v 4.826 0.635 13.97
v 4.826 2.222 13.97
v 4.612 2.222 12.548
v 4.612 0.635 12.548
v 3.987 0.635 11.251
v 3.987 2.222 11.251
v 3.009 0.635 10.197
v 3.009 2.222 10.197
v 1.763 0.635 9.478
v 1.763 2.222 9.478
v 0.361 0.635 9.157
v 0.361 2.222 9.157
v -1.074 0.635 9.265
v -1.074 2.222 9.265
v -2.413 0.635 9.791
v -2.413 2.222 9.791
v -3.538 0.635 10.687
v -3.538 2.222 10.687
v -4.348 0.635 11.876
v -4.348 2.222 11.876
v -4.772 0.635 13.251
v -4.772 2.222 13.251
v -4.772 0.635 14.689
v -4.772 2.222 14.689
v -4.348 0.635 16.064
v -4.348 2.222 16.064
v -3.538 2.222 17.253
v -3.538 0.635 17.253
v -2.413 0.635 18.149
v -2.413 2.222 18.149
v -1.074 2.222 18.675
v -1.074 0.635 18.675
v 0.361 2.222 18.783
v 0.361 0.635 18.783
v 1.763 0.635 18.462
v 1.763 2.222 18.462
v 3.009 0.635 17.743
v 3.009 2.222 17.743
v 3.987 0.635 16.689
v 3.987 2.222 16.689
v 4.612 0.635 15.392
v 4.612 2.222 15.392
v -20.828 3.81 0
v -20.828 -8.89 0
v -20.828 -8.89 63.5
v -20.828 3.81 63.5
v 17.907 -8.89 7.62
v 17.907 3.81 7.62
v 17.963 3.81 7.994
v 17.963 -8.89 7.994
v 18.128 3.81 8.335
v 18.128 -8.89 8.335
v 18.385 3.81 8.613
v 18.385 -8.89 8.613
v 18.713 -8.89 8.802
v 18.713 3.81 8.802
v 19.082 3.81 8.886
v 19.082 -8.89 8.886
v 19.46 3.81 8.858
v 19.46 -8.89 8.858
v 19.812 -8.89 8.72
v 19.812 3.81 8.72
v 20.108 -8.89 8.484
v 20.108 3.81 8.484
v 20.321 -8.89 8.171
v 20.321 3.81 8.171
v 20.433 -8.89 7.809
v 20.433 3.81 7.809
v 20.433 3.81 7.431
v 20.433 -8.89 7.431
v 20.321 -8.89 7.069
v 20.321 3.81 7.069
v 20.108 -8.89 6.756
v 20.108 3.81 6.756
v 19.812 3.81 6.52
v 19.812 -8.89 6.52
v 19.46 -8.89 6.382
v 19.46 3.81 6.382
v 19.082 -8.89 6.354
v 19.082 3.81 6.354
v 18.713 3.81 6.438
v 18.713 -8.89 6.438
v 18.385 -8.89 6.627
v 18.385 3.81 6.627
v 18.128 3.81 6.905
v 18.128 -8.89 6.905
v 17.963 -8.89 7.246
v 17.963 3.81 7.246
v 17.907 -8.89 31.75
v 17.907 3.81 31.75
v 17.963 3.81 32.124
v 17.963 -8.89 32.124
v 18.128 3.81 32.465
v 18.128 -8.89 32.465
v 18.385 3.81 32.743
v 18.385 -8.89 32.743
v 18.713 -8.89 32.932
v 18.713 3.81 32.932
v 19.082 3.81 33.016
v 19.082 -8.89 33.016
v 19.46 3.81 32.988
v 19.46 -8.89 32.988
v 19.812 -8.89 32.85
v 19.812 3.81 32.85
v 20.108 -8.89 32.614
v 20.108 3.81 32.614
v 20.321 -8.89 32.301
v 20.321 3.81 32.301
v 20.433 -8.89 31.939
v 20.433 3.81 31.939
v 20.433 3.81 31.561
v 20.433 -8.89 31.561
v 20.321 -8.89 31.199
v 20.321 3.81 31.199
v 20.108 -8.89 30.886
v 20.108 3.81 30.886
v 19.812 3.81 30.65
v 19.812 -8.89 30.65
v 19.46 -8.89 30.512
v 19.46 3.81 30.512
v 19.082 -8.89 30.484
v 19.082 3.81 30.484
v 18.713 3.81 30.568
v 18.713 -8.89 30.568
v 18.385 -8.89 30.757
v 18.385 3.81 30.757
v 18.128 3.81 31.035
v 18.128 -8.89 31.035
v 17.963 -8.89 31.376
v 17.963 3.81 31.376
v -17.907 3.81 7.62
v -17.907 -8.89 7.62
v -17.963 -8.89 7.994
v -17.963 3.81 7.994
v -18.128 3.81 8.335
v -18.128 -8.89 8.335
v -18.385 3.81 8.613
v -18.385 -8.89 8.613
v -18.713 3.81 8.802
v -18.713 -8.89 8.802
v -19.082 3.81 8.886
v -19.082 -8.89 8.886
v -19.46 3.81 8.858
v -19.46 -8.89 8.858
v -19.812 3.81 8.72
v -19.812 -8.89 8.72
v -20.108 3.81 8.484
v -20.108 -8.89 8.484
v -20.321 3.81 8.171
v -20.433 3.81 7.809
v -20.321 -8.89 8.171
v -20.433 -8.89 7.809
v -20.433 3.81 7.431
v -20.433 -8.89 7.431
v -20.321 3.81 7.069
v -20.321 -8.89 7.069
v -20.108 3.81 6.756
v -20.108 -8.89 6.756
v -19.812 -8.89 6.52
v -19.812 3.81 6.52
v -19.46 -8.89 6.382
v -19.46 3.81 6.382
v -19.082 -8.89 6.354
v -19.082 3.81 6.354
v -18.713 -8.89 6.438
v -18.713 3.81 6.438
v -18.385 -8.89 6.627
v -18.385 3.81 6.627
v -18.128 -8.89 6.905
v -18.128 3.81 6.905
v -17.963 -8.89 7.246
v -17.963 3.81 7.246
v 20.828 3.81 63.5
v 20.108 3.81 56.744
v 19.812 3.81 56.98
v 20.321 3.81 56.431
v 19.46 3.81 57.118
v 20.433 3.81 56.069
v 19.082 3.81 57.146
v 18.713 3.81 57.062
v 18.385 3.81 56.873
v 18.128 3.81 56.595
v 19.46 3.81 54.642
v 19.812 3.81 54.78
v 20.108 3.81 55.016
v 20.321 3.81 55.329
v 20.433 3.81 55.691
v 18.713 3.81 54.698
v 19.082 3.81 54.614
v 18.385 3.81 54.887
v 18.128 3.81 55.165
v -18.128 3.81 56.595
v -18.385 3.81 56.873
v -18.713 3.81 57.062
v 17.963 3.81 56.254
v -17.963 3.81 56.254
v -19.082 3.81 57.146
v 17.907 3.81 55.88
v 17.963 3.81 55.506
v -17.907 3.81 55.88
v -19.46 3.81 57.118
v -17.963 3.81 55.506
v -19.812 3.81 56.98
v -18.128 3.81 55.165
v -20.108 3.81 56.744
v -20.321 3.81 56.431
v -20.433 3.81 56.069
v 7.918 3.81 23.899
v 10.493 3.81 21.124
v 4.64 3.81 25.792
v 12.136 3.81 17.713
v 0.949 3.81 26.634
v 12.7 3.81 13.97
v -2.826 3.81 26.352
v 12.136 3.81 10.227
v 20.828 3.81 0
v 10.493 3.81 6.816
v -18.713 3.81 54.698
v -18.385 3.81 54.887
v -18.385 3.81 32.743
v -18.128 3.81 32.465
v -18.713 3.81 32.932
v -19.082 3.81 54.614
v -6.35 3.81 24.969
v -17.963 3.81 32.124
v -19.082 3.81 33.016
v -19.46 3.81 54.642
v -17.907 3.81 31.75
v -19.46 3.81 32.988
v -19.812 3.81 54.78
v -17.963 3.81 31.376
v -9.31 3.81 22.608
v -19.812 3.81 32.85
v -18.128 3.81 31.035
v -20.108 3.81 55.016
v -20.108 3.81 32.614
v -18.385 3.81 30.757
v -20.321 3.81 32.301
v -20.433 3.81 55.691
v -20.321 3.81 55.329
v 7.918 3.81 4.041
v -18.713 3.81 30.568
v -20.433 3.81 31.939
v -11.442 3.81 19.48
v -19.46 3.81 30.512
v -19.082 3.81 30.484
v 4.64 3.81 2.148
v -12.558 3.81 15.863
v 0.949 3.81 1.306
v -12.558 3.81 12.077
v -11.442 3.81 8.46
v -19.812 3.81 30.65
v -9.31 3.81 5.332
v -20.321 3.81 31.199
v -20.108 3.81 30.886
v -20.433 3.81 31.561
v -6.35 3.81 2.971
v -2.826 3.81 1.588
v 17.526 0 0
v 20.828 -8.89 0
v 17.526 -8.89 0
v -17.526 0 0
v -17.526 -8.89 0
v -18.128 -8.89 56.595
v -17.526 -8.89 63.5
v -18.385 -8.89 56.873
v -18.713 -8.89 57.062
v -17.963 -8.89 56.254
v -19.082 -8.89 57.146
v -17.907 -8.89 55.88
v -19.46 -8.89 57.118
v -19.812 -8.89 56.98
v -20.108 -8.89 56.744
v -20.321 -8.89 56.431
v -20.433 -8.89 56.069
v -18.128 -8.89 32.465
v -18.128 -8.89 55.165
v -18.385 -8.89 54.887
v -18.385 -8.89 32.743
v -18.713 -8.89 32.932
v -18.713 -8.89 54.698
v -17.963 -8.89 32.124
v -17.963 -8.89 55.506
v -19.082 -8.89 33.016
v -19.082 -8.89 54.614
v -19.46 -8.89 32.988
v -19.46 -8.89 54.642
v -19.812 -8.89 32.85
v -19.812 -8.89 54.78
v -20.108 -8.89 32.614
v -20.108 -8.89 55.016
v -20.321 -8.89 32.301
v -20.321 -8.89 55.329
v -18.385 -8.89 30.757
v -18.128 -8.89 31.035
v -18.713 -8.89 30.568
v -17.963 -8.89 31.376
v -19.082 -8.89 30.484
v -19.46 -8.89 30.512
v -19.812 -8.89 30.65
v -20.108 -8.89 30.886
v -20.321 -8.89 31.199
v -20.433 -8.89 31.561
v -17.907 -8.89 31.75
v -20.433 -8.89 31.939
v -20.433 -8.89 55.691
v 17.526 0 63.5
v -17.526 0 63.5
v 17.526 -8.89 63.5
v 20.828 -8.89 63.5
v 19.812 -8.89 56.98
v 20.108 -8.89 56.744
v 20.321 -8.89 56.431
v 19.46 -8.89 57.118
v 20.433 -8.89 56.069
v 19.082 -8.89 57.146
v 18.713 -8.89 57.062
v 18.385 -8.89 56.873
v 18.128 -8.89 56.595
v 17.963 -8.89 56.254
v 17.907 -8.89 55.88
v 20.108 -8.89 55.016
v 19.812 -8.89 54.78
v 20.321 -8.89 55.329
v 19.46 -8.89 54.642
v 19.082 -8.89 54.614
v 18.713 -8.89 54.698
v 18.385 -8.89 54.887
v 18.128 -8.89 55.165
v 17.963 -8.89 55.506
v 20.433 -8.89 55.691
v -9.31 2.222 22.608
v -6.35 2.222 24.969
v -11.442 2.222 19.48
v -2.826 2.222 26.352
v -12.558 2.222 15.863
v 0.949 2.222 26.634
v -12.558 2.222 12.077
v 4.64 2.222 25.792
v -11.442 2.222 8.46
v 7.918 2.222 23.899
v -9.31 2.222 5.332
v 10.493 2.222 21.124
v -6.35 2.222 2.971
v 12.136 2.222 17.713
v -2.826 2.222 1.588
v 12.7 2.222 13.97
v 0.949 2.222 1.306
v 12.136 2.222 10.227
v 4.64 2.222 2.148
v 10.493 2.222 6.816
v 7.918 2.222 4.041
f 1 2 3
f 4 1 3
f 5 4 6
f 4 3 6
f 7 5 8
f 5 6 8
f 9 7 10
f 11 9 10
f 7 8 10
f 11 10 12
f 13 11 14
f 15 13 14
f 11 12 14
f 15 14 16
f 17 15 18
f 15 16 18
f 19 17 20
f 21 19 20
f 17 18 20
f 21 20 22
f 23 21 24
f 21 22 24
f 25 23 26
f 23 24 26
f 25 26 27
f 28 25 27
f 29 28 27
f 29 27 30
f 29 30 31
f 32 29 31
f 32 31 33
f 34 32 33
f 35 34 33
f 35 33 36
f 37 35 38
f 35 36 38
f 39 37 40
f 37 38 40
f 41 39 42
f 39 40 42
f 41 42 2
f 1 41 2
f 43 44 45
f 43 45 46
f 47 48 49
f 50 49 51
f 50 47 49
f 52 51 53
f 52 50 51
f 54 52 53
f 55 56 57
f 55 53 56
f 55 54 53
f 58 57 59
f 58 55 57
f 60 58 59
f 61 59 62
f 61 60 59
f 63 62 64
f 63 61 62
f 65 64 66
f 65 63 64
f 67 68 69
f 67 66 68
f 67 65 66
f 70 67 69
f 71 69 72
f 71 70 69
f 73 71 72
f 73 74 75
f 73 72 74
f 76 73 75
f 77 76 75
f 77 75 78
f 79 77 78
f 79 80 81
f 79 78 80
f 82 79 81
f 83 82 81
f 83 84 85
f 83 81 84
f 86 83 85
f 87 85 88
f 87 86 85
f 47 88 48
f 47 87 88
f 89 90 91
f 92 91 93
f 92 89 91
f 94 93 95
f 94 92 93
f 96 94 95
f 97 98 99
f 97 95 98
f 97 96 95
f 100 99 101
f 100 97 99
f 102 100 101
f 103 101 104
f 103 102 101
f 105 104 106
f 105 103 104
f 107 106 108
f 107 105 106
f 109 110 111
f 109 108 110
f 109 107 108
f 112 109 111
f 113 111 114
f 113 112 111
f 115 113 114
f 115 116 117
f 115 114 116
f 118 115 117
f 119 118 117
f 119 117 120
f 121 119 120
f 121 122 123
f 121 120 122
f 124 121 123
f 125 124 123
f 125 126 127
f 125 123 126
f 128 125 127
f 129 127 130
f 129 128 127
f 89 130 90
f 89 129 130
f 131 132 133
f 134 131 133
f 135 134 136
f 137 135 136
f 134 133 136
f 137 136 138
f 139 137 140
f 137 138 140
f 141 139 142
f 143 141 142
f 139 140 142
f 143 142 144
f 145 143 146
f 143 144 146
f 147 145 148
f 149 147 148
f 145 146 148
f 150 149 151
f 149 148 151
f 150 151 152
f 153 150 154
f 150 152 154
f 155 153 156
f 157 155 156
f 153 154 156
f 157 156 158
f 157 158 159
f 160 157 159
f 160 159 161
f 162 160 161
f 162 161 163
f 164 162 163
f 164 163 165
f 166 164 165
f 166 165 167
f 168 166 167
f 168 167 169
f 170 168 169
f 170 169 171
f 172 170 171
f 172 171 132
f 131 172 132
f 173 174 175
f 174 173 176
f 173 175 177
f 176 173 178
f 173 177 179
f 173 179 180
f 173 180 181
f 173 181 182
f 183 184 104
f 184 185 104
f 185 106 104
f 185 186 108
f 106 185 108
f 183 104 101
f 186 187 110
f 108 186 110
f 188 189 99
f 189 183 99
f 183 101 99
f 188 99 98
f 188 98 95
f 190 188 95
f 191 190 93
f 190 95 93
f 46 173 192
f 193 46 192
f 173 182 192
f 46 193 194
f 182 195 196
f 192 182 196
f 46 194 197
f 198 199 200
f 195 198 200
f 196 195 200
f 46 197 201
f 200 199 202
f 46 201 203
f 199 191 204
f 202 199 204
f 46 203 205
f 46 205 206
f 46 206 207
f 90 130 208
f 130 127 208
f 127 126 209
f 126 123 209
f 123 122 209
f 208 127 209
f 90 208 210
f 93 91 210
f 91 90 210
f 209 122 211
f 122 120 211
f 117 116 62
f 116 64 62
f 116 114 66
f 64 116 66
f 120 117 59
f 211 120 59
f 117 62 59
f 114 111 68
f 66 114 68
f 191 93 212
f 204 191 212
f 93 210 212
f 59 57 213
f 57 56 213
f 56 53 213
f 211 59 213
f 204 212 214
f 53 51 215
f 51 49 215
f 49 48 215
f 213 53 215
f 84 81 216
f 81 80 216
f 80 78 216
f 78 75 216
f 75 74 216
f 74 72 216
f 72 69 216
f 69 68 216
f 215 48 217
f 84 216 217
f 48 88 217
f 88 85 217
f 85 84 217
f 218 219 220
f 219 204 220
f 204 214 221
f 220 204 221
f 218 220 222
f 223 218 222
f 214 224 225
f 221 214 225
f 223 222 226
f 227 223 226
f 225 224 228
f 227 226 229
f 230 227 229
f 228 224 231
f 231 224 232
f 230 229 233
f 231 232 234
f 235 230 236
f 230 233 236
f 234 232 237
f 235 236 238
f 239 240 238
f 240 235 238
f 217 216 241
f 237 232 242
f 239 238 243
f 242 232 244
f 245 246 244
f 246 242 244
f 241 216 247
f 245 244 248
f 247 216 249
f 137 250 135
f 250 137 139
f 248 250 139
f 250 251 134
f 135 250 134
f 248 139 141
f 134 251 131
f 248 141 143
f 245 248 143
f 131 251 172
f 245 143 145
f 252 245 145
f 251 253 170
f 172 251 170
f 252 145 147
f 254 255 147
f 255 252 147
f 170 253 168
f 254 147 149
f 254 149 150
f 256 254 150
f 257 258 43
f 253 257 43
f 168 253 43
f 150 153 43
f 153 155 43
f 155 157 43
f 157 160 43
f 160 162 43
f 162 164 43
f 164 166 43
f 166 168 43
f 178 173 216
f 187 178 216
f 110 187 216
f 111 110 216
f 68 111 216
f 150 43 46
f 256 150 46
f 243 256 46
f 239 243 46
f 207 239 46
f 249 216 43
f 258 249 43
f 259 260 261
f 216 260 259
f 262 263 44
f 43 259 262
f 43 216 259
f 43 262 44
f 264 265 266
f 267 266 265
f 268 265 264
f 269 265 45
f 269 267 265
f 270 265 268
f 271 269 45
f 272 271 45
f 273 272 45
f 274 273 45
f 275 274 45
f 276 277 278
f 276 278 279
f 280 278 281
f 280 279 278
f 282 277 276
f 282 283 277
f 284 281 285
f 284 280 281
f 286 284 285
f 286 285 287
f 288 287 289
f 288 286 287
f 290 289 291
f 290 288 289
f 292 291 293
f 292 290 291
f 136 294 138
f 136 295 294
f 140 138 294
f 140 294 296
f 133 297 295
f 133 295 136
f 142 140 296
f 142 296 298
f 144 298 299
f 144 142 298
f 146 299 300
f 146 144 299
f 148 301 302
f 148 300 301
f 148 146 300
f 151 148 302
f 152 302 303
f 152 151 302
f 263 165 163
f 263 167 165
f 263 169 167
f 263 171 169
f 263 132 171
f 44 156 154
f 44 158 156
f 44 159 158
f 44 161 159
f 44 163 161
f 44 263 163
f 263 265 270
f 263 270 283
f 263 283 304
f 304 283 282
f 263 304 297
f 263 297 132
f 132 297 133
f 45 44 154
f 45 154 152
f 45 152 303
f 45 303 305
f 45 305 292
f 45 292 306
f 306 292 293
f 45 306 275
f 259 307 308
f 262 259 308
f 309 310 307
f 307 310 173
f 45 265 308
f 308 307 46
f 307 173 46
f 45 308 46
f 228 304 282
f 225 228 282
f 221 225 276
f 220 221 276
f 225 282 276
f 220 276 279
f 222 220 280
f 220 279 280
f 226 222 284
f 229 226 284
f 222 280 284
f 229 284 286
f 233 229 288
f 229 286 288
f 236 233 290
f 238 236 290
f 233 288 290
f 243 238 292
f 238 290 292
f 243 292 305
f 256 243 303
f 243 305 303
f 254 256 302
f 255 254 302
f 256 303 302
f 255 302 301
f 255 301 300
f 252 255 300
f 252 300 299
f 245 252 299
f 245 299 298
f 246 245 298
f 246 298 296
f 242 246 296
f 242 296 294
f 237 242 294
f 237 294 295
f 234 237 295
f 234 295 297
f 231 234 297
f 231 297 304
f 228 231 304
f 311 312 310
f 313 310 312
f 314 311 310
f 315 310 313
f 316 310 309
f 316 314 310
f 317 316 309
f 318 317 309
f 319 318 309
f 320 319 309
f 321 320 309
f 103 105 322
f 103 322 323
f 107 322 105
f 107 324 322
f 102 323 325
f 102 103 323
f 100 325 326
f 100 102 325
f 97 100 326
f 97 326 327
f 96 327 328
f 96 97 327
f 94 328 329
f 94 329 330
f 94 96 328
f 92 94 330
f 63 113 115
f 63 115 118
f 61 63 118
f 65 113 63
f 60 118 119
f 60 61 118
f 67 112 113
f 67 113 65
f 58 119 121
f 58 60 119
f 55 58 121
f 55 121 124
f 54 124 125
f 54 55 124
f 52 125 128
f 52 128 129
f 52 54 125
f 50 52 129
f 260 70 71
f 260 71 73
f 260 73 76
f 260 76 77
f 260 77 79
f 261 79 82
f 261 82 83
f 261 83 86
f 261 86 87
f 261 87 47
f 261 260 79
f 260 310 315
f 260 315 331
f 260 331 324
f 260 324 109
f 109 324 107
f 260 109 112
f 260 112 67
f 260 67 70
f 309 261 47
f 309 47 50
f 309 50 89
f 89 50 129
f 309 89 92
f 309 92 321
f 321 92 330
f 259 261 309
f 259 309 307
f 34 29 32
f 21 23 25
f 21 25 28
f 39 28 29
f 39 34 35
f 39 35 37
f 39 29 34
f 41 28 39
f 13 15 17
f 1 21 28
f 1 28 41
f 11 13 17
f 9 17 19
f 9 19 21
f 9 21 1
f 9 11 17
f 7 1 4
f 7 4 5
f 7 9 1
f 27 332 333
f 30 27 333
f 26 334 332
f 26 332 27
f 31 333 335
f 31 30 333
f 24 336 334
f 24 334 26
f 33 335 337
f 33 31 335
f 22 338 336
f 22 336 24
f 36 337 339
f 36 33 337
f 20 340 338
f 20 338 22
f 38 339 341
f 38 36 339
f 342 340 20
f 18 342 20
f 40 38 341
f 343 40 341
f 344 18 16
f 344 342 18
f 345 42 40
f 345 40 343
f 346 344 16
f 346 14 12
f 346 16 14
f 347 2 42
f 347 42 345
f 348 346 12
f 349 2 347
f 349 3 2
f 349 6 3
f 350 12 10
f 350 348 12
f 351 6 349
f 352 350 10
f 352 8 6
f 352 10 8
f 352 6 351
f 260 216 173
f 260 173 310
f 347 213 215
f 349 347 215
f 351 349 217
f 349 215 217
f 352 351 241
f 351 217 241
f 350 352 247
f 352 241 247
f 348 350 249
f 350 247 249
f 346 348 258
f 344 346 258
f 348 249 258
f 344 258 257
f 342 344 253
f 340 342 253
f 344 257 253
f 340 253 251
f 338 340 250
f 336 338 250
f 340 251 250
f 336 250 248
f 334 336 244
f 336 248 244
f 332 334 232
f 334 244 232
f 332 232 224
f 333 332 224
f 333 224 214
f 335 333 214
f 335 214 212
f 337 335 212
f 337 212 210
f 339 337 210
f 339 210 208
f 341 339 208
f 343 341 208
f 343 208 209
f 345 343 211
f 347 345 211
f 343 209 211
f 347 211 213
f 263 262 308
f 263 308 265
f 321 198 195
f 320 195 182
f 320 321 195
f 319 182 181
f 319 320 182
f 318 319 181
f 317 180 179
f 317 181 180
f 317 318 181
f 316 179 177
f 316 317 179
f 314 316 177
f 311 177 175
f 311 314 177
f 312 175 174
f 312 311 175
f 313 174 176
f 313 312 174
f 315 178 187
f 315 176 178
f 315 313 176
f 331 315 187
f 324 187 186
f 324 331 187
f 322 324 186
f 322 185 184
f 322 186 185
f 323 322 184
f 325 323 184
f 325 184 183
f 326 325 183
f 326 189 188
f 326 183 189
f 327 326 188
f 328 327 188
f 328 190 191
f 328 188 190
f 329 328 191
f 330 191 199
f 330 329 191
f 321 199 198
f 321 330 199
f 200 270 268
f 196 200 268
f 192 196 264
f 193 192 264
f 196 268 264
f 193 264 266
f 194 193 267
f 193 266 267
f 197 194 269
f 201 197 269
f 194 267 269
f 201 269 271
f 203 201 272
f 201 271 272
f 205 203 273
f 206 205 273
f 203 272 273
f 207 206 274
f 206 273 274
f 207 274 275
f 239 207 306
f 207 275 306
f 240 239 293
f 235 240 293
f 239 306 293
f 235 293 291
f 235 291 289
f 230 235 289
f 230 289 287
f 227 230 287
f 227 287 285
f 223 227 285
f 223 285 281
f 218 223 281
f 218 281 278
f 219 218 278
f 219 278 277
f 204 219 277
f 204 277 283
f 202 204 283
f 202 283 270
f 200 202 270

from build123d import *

# Parameters (mm, degrees)
BOSS_EXTRUDE1_DEPTH = 63.5
SKETCH4_R           = 1.27
CUT_EXTRUDE2_DEPTH  = 63.5
SKETCH6_R           = 12.7
CUT_EXTRUDE7_DEPTH  = 1.5875
SKETCH8_R           = 4.826
CUT_EXTRUDE8_DEPTH  = 1.5875


with BuildPart() as part:
    # Sketch2 → Boss-Extrude1 (new body)
    with BuildSketch(Plane.XY):
        Polygon((-18.314458333, 3.81), (20.828, 3.81), (20.828, -8.89), (17.526, -8.89), (17.526, 0), (-17.526, 0), (-17.526, -8.89), (-20.828, -8.89), (-20.828, 3.81), align=None)
    extrude(amount=BOSS_EXTRUDE1_DEPTH)

    # Sketch4 → Cut-Extrude2 (cut)
    with BuildSketch(Plane.XZ.offset(8.89)):
        with Locations((-19.177, 7.62)):
            Circle(SKETCH4_R)
        with Locations((-19.177, 55.88)):
            Circle(SKETCH4_R)
        with Locations((-19.177, 31.75)):
            Circle(SKETCH4_R)
    cut_extrude2 = extrude(amount=-CUT_EXTRUDE2_DEPTH, mode=Mode.SUBTRACT)

    # Mirror1: Cut-Extrude2 across plane
    add(cut_extrude2.mirror(Plane(origin=(0, 0, 0), x_dir=(0, 0, 1), z_dir=(1, 0, 0))), mode=Mode.SUBTRACT)

    # Sketch6 → Cut-Extrude7 (cut)
    with BuildSketch(Plane(origin=(0, 3.81, 0), x_dir=(1, 0, 0), z_dir=(0, 1, 0))):
        with Locations((0, -13.97)):
            Circle(SKETCH6_R)
    extrude(amount=-CUT_EXTRUDE7_DEPTH, mode=Mode.SUBTRACT)

    # Sketch8 → Cut-Extrude8 (cut)
    with BuildSketch(Plane(origin=(0, 2.2225, 0), x_dir=(1, 0, 0), z_dir=(0, 1, 0))):
        with Locations((0, -13.97)):
            Circle(SKETCH8_R)
    extrude(amount=-CUT_EXTRUDE8_DEPTH, mode=Mode.SUBTRACT)


solid = part.part
